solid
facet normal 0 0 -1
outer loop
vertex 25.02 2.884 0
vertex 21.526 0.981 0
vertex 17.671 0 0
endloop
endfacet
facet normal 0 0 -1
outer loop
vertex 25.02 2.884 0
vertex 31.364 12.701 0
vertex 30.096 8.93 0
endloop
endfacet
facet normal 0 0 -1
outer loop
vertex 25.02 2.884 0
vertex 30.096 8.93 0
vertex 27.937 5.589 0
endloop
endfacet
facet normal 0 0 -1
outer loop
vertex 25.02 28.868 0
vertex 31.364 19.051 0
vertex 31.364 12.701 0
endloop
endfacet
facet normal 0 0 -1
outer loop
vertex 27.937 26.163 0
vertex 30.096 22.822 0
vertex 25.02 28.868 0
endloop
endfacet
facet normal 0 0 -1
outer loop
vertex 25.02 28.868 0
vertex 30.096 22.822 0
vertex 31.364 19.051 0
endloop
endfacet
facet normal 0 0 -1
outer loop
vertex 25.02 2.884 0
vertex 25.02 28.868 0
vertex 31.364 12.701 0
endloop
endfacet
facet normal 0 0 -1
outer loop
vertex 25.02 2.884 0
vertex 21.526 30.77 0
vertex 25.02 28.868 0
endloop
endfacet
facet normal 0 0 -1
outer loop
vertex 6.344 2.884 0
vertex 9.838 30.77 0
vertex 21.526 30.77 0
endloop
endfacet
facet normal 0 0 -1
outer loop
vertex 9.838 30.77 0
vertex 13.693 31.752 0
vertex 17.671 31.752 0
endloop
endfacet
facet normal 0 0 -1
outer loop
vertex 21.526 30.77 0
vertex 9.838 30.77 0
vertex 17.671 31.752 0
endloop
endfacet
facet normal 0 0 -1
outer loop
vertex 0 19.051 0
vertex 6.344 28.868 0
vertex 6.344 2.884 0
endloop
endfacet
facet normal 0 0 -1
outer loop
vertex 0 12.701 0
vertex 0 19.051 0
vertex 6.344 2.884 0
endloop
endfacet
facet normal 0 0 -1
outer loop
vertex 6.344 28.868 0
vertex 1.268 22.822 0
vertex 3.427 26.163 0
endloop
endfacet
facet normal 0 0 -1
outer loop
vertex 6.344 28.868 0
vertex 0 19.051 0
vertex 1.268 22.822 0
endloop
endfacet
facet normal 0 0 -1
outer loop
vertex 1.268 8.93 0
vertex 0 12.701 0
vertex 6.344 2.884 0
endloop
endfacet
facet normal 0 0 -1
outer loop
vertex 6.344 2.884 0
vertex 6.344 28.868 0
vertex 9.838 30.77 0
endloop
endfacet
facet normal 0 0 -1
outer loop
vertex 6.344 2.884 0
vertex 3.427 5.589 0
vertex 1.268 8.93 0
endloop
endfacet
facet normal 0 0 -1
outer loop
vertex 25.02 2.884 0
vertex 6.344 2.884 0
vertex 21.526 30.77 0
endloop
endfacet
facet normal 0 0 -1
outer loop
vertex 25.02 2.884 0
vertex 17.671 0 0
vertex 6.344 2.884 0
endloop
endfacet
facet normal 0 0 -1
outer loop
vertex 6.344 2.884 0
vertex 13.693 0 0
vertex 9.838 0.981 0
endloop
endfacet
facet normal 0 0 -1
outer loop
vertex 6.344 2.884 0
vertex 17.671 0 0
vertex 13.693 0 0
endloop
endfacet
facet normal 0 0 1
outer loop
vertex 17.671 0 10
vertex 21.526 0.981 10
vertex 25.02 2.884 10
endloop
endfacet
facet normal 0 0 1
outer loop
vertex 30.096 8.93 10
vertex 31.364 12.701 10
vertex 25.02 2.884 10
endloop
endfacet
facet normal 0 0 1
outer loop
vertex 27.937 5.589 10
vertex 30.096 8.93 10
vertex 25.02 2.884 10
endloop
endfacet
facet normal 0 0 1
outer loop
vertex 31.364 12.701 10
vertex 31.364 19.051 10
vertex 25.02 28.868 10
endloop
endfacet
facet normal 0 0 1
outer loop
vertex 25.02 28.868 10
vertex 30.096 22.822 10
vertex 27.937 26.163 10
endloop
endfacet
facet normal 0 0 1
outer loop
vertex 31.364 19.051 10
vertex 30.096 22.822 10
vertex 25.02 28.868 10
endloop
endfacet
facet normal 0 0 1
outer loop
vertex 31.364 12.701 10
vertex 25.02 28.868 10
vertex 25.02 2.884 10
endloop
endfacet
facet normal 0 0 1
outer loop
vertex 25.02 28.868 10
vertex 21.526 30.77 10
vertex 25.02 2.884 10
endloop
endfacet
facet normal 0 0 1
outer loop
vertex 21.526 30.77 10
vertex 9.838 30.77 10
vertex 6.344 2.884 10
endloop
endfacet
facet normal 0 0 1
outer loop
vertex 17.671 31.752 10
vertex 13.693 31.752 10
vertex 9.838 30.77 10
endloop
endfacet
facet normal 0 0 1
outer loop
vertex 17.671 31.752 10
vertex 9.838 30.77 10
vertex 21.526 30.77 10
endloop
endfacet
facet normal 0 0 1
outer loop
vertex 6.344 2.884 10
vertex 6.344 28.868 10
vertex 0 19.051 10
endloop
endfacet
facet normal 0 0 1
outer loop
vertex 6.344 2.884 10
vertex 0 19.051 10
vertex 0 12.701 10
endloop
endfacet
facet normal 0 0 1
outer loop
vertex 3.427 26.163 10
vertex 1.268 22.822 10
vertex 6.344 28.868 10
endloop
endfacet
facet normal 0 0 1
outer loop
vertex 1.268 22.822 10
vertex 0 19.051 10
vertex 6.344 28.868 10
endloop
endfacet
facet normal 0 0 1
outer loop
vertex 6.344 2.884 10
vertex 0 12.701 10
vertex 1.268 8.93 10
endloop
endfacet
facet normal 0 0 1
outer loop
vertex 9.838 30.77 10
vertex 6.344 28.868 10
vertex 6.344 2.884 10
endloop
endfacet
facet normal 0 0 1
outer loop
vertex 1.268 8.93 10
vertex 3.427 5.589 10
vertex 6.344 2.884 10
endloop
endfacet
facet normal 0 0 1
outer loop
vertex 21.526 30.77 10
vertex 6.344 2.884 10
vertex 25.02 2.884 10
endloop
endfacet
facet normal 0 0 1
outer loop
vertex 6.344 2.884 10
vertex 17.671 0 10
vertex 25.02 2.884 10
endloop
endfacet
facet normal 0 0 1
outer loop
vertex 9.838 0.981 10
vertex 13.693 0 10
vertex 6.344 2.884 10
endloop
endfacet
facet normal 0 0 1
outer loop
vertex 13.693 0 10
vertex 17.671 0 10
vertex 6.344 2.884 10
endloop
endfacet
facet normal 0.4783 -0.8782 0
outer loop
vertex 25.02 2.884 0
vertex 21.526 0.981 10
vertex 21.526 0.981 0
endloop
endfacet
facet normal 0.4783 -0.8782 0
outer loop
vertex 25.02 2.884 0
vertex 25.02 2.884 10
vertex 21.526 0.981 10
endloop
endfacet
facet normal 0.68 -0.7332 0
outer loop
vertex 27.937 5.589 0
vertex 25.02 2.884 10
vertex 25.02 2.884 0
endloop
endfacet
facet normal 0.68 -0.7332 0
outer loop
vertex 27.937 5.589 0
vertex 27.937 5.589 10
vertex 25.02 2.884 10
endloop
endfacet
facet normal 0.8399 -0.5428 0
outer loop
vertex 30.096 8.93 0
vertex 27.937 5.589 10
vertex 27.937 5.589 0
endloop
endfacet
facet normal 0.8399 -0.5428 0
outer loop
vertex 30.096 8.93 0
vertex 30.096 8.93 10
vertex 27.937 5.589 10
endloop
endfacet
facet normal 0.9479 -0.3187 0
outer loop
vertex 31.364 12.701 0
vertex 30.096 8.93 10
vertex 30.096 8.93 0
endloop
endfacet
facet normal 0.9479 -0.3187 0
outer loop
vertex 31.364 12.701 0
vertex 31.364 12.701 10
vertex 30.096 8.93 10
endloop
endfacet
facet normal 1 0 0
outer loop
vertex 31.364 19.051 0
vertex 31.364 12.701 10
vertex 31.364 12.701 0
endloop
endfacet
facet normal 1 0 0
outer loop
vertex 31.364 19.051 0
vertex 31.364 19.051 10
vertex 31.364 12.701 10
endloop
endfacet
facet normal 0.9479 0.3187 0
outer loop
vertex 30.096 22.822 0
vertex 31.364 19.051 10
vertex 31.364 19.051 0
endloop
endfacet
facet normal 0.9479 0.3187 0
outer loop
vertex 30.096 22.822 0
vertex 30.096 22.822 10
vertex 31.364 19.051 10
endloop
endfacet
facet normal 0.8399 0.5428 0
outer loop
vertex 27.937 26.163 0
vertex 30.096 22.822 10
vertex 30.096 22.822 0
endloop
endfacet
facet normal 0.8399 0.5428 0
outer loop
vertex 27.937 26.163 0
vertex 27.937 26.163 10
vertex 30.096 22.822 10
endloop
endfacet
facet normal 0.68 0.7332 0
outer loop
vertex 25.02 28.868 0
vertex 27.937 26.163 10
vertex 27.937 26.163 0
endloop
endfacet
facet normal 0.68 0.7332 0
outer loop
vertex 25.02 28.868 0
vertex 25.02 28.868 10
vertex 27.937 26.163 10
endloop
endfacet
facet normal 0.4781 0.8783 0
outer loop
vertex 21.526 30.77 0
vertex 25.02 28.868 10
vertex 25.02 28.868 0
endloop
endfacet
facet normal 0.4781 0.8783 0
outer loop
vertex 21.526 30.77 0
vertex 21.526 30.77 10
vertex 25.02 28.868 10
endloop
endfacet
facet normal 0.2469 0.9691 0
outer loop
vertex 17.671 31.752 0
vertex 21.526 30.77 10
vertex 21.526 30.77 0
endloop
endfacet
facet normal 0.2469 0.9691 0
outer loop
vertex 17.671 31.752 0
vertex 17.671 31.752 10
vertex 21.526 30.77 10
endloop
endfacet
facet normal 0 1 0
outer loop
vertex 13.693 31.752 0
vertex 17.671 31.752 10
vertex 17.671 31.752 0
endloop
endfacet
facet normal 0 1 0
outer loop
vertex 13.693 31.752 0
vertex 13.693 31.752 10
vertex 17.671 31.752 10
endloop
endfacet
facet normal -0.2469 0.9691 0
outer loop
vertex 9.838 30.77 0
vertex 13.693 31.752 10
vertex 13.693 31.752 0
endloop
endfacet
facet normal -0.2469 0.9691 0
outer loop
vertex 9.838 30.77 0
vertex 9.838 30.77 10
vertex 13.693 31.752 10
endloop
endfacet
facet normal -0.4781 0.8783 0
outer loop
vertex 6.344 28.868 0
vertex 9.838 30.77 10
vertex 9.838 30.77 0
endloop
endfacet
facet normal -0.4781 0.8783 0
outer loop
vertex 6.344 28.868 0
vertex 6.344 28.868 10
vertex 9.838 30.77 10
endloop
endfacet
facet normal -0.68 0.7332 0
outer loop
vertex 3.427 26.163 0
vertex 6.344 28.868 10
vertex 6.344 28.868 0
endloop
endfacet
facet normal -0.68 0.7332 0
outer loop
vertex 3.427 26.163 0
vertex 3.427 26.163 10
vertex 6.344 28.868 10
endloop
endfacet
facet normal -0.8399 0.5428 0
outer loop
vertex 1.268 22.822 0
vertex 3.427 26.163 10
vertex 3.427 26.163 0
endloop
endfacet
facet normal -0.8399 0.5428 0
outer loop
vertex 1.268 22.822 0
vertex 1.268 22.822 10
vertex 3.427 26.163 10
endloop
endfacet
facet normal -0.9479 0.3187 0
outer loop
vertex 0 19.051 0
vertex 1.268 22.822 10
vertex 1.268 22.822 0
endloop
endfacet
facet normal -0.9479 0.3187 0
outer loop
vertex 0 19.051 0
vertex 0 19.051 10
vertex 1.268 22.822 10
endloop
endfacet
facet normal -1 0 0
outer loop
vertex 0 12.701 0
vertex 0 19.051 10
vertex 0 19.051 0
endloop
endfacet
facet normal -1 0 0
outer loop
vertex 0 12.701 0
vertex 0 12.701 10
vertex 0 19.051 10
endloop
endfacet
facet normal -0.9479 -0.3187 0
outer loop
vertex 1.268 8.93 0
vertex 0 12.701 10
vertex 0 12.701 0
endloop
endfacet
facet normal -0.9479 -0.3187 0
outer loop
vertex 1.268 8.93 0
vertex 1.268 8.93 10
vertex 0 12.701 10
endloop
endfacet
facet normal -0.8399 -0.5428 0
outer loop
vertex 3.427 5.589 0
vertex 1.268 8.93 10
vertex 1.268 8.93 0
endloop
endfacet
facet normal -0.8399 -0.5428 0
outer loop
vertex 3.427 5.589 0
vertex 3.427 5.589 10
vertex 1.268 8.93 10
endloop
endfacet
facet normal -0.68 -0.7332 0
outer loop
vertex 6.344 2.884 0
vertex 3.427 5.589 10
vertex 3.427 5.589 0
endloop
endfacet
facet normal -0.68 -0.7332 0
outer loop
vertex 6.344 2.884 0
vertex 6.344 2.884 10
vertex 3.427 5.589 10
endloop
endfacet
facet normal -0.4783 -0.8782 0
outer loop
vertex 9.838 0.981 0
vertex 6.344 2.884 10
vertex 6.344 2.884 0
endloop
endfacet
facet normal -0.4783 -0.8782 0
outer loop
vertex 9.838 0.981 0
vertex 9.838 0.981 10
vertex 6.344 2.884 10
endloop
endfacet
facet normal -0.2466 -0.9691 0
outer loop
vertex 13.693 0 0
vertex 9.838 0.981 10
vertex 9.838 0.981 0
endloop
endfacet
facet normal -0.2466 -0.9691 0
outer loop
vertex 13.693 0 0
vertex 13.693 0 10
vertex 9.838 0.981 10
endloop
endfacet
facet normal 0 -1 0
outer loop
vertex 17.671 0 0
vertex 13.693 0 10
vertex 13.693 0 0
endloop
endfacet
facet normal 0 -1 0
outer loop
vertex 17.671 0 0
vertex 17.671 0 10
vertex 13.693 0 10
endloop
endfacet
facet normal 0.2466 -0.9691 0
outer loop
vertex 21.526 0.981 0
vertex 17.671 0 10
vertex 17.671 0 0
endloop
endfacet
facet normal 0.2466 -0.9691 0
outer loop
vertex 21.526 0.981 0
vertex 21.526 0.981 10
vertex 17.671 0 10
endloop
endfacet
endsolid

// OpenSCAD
$fn = 32;

// ----------------------------------------------------------------------
// Flat adaptor: double_d, 10 mm thick
// ----------------------------------------------------------------------

// --- parameters (mm) ---
profile_height = 10;      // extrusion height
profile_points = 24;      // points of the closed outline

profile = [[31.364, 19.051], [30.096, 22.822], [27.937, 26.163], [25.02, 28.868], [21.526, 30.77], [17.671, 31.752], [13.693, 31.752], [9.838, 30.77], [6.344, 28.868], [3.427, 26.163], [1.268, 22.822], [0, 19.051], [0, 12.701], [1.268, 8.93], [3.427, 5.589], [6.344, 2.884], [9.838, 0.981], [13.693, 0], [17.671, 0], [21.526, 0.981], [25.02, 2.884], [27.937, 5.589], [30.096, 8.93], [31.364, 12.701]];  // single closed polygon, 24 points, counter clockwise

// --- the one profile operation ---
linear_extrude(height = profile_height) polygon(points = profile);
